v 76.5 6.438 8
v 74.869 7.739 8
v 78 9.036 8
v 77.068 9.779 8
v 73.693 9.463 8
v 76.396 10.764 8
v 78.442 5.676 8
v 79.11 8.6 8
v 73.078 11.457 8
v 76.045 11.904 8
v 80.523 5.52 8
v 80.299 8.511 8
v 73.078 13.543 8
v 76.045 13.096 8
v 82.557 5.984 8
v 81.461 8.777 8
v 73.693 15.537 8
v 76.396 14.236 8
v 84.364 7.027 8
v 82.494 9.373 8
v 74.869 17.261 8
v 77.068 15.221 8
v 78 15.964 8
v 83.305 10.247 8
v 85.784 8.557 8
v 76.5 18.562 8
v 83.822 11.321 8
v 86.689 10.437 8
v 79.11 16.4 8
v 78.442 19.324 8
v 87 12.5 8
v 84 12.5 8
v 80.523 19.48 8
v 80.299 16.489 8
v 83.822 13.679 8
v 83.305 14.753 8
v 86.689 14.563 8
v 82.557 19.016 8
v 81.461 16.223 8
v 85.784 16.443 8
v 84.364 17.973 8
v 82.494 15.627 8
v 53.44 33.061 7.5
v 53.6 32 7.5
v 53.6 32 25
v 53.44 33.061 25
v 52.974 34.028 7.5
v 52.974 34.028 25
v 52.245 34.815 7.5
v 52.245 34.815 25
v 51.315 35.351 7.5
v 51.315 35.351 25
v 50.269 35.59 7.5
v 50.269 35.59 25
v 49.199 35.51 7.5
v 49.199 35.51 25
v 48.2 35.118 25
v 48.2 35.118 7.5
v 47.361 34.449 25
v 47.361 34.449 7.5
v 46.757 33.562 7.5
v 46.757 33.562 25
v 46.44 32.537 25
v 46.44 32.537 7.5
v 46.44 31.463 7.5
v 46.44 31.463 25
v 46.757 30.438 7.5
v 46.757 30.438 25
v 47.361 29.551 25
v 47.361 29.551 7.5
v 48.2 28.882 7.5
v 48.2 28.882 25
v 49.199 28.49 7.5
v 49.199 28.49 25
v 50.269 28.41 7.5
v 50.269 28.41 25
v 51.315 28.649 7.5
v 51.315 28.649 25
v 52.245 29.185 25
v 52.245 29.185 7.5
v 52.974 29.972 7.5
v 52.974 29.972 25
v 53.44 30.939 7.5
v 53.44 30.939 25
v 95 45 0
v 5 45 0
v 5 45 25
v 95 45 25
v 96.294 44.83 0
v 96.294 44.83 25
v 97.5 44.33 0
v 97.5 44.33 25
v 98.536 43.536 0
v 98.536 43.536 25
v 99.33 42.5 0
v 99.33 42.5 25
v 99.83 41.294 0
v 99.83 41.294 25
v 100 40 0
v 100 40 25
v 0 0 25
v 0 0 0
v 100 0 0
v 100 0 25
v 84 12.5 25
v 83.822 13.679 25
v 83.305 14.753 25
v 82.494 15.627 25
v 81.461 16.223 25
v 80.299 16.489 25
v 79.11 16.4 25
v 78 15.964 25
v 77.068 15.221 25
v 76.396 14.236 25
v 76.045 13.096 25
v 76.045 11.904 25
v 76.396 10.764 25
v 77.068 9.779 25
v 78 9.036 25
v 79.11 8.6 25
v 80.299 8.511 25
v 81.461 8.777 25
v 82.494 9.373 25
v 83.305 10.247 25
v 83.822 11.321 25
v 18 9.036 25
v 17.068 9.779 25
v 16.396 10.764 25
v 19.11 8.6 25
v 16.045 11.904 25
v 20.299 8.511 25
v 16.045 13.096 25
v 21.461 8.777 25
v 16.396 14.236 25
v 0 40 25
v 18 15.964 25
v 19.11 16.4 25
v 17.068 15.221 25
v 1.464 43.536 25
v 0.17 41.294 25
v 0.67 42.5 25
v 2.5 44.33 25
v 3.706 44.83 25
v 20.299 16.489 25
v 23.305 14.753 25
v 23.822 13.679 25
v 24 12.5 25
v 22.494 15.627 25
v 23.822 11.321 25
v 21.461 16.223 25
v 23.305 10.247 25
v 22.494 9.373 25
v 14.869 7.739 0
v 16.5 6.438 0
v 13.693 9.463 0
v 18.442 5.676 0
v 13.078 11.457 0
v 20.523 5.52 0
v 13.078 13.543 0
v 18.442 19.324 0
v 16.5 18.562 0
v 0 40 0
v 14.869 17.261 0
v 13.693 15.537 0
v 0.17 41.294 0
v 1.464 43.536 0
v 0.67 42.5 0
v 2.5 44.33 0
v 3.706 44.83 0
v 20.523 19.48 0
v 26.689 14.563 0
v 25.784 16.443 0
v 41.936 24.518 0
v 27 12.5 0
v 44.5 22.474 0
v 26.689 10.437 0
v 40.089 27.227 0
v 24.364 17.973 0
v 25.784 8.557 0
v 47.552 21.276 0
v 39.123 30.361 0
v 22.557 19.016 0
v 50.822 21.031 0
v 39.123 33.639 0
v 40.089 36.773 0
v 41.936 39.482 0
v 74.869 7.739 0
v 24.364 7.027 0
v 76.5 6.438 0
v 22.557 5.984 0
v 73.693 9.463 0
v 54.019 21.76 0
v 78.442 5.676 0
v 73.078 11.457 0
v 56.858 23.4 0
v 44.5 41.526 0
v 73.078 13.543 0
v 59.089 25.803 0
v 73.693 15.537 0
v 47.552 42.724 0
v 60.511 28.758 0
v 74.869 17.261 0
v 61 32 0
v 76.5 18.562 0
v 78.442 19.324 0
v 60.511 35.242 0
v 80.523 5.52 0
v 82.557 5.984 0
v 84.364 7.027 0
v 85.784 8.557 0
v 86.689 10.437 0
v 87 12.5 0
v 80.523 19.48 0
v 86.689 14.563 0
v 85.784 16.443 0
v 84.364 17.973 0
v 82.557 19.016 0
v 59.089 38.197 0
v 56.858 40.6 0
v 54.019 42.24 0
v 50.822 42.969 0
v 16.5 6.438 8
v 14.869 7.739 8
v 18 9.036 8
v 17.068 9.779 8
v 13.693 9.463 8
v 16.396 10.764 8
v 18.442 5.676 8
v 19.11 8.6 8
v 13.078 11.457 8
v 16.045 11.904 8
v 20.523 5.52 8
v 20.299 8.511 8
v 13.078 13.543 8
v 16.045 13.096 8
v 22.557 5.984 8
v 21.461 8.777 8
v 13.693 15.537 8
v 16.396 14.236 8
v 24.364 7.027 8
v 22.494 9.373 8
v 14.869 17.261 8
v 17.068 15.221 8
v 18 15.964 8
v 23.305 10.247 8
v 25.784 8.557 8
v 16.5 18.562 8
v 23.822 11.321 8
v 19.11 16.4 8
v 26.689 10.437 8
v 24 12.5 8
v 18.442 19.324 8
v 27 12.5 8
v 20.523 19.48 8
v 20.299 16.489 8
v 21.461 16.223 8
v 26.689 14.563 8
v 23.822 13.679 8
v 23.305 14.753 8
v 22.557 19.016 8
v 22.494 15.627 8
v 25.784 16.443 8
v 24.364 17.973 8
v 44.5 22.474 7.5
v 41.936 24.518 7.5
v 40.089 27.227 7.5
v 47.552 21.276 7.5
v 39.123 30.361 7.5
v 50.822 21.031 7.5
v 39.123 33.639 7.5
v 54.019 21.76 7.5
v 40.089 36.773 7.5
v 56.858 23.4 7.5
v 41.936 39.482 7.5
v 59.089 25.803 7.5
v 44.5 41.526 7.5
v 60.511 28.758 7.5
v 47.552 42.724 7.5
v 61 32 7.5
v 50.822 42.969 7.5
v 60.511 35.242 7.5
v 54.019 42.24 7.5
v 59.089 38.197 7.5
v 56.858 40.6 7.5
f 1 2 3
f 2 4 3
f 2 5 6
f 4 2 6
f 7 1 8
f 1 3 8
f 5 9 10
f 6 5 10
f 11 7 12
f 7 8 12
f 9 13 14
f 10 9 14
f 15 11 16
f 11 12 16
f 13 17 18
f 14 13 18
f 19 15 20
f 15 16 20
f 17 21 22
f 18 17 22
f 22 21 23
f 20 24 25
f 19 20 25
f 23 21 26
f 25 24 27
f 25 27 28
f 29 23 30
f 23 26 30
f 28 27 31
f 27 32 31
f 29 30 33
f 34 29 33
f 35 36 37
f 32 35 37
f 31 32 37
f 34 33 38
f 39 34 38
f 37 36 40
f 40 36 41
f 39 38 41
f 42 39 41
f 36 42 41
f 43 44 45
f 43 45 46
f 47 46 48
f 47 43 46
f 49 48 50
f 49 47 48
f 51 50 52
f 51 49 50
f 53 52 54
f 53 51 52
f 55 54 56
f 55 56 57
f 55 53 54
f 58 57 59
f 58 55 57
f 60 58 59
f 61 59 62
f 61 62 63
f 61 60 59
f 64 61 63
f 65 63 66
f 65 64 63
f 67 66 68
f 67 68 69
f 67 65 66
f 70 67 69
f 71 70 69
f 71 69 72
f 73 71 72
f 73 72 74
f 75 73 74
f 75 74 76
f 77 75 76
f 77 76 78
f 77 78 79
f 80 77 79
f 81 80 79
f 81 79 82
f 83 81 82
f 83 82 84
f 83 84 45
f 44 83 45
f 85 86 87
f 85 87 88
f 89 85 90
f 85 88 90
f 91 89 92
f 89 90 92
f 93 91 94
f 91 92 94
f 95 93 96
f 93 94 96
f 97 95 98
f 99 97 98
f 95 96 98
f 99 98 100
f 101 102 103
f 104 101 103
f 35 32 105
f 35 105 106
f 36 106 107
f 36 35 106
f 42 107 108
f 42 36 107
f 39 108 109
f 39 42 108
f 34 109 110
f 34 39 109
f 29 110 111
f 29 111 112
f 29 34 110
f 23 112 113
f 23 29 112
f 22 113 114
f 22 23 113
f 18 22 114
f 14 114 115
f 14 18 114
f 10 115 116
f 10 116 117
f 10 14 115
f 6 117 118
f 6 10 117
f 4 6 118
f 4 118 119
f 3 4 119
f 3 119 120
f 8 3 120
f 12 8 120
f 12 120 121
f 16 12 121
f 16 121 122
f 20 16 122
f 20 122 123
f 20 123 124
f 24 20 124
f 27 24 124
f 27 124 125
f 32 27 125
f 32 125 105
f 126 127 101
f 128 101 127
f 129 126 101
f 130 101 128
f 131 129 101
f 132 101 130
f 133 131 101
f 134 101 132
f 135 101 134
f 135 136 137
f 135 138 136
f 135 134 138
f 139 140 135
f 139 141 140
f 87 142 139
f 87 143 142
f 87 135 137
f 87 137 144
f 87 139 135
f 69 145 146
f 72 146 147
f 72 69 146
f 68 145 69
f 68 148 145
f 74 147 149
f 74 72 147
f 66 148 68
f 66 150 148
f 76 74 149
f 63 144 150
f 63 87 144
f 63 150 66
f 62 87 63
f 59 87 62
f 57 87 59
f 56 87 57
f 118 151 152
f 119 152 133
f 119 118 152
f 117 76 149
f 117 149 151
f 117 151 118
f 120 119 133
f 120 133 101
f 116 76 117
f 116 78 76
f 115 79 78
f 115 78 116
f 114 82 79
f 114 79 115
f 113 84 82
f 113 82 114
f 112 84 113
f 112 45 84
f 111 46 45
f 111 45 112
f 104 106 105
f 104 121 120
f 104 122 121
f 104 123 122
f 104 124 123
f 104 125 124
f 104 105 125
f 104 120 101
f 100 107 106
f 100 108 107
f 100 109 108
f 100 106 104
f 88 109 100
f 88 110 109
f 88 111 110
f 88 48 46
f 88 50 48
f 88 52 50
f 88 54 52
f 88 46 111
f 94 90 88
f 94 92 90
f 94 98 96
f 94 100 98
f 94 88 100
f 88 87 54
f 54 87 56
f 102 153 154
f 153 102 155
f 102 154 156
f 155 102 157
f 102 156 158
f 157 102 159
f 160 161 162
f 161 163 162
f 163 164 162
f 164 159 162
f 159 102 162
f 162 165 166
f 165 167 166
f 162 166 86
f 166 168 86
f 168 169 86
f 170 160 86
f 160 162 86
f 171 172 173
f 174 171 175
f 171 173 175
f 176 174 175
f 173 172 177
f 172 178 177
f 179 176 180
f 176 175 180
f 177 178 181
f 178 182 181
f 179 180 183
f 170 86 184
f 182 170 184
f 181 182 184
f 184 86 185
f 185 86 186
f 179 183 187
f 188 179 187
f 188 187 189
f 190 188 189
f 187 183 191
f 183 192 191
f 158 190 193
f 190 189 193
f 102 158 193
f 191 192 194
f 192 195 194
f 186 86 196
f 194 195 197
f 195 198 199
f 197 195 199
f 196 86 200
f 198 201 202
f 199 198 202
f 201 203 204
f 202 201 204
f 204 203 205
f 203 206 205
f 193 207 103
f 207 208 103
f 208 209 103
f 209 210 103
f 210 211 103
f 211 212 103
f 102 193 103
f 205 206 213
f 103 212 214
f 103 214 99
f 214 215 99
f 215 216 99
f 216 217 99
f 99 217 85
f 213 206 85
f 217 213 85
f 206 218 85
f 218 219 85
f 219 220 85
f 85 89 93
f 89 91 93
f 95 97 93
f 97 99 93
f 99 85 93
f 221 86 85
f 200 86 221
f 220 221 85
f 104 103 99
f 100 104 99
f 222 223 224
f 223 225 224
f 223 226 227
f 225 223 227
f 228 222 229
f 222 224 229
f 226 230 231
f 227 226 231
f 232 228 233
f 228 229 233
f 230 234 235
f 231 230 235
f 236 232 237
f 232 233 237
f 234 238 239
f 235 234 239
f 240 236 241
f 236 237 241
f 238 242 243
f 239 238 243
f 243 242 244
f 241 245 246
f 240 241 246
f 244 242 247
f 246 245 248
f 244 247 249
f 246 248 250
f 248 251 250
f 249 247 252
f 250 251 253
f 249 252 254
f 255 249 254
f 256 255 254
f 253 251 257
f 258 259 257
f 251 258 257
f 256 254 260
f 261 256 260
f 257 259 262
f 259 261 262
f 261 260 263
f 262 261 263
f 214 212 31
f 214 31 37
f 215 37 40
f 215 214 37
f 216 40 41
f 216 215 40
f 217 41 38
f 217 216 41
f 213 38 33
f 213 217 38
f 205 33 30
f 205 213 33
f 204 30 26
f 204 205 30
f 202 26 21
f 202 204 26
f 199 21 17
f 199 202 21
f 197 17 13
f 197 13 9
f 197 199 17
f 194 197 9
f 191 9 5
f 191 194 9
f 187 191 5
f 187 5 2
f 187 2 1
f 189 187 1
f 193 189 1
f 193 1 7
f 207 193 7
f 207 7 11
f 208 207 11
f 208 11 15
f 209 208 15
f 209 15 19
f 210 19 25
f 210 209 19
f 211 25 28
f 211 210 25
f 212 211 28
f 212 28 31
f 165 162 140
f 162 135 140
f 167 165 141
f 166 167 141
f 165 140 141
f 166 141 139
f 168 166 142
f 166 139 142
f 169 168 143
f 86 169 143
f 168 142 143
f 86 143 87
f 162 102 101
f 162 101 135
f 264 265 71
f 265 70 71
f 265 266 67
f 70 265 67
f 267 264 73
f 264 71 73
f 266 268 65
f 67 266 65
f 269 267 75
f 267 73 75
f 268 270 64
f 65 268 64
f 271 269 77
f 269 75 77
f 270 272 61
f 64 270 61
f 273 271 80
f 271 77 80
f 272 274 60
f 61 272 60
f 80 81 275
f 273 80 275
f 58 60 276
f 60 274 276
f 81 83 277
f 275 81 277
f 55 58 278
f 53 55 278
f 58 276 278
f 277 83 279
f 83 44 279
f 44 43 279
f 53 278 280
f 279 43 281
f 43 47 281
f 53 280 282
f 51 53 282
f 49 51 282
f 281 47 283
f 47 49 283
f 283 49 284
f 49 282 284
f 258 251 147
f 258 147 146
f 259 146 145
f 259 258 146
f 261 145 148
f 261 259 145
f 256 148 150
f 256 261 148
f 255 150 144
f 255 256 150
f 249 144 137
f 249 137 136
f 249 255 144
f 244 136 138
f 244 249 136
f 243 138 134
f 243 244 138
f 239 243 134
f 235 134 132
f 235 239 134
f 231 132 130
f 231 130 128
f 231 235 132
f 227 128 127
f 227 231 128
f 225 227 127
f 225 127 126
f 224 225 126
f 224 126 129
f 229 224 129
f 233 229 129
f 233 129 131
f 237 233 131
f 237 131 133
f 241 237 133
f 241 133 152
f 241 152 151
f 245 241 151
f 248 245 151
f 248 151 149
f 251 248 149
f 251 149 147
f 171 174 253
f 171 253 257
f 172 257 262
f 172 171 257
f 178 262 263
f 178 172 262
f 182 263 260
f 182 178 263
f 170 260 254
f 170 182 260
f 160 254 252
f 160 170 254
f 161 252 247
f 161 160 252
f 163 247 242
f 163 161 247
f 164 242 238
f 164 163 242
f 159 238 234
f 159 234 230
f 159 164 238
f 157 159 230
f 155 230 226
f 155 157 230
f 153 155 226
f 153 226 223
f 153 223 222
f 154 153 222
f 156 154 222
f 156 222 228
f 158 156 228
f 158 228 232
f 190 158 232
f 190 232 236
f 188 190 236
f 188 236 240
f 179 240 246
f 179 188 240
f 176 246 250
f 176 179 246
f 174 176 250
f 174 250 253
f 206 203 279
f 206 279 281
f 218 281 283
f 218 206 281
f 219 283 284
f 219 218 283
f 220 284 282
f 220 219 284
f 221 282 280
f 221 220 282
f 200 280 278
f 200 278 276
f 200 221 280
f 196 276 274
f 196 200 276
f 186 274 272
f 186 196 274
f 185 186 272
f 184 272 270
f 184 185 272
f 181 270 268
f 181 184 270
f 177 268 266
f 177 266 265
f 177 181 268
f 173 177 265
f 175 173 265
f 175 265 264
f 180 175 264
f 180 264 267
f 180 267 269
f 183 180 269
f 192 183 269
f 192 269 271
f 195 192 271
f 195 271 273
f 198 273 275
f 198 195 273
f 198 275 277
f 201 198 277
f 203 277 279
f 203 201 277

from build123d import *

# Parameters (mm, degrees)
SKETCH1_W           = 100
SKETCH1_H           = 45
SKETCH1_R           = 4
SKETCH1_R_2         = 3.6
BOSS_EXTRUDE1_DEPTH = 25
SKETCH1_3_R         = 11
CUT_EXTRUDE1_DEPTH  = 7.5
FILLET1_R           = 5
SKETCH1_4_R         = 7
CUT_EXTRUDE2_DEPTH  = 8


with BuildPart() as part:
    # Sketch1 → Boss-Extrude1 (new body)
    with BuildSketch(Plane.XY):
        with Locations((50, 22.5)):
            Rectangle(SKETCH1_W, SKETCH1_H)
        with Locations((20, 12.5)):
            Circle(SKETCH1_R, mode=Mode.SUBTRACT)
        with Locations((50, 32)):
            Circle(SKETCH1_R_2, mode=Mode.SUBTRACT)
        with Locations((80, 12.5)):
            Circle(SKETCH1_R, mode=Mode.SUBTRACT)
    extrude(amount=BOSS_EXTRUDE1_DEPTH)

    # Sketch1<3> → Cut-Extrude1 (cut)
    with BuildSketch(Plane.XY):
        with Locations((50, 32)):
            Circle(SKETCH1_3_R)
    extrude(amount=CUT_EXTRUDE1_DEPTH, mode=Mode.SUBTRACT)

    # Fillet1
    fillet1_edges = [part.edges().sort_by_distance(p)[0] for p in [
        (100, 45, 12.5),
        (0, 45, 12.5),
    ]]
    fillet(fillet1_edges, radius=FILLET1_R)

    # Sketch1<4> → Cut-Extrude2 (cut)
    with BuildSketch(Plane.XY):
        with Locations((80, 12.5)):
            Circle(SKETCH1_4_R)
        with Locations((20, 12.5)):
            Circle(SKETCH1_4_R)
    extrude(amount=CUT_EXTRUDE2_DEPTH, mode=Mode.SUBTRACT)


solid = part.part
